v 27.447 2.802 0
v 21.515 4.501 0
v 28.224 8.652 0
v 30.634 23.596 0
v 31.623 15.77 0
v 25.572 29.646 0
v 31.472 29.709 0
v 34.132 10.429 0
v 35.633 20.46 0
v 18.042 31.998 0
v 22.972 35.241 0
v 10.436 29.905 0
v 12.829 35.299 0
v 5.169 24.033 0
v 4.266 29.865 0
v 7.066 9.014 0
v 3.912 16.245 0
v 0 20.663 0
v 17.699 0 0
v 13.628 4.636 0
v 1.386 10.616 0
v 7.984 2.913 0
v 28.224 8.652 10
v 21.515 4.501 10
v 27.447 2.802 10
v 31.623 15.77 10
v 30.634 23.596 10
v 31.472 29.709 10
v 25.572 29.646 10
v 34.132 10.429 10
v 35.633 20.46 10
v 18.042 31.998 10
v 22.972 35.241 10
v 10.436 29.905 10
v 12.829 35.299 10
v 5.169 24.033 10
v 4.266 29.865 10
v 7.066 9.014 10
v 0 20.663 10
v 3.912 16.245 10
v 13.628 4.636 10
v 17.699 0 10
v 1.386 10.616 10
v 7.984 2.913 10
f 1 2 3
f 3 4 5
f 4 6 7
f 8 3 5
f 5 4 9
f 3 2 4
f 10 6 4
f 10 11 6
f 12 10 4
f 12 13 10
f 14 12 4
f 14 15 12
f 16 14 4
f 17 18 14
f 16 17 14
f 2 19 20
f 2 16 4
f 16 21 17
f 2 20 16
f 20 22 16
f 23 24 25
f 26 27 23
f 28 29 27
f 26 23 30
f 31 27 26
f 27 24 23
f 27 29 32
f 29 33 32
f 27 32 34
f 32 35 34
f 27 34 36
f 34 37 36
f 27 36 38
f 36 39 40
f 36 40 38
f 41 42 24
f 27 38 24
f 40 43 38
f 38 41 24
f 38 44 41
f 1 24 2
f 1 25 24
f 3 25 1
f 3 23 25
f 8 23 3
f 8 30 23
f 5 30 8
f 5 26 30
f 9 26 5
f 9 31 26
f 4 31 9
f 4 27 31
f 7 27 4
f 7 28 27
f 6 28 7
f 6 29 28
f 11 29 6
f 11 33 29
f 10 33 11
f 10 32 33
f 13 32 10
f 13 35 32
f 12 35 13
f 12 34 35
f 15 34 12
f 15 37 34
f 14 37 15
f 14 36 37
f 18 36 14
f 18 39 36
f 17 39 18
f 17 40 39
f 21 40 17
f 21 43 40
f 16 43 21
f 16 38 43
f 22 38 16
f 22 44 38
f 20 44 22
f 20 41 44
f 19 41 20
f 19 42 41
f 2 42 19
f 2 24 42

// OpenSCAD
$fn = 32;

// ----------------------------------------------------------------------
// Chain sprocket: 11 teeth, 14 mm root radius
// ----------------------------------------------------------------------

// --- parameters (mm) ---
profile_height = 10;      // extrusion height
profile_points = 22;      // points of the closed outline

profile = [[31.623, 15.77], [35.633, 20.46], [30.634, 23.596], [31.472, 29.709], [25.572, 29.646], [22.972, 35.241], [18.042, 31.998], [12.829, 35.299], [10.436, 29.905], [4.266, 29.865], [5.169, 24.033], [0, 20.663], [3.912, 16.245], [1.386, 10.616], [7.066, 9.014], [7.984, 2.913], [13.628, 4.636], [17.699, 0], [21.515, 4.501], [27.447, 2.802], [28.224, 8.652], [34.132, 10.429]];  // single closed polygon, 22 points, counter clockwise

// --- the one profile operation ---
linear_extrude(height = profile_height) polygon(points = profile);
